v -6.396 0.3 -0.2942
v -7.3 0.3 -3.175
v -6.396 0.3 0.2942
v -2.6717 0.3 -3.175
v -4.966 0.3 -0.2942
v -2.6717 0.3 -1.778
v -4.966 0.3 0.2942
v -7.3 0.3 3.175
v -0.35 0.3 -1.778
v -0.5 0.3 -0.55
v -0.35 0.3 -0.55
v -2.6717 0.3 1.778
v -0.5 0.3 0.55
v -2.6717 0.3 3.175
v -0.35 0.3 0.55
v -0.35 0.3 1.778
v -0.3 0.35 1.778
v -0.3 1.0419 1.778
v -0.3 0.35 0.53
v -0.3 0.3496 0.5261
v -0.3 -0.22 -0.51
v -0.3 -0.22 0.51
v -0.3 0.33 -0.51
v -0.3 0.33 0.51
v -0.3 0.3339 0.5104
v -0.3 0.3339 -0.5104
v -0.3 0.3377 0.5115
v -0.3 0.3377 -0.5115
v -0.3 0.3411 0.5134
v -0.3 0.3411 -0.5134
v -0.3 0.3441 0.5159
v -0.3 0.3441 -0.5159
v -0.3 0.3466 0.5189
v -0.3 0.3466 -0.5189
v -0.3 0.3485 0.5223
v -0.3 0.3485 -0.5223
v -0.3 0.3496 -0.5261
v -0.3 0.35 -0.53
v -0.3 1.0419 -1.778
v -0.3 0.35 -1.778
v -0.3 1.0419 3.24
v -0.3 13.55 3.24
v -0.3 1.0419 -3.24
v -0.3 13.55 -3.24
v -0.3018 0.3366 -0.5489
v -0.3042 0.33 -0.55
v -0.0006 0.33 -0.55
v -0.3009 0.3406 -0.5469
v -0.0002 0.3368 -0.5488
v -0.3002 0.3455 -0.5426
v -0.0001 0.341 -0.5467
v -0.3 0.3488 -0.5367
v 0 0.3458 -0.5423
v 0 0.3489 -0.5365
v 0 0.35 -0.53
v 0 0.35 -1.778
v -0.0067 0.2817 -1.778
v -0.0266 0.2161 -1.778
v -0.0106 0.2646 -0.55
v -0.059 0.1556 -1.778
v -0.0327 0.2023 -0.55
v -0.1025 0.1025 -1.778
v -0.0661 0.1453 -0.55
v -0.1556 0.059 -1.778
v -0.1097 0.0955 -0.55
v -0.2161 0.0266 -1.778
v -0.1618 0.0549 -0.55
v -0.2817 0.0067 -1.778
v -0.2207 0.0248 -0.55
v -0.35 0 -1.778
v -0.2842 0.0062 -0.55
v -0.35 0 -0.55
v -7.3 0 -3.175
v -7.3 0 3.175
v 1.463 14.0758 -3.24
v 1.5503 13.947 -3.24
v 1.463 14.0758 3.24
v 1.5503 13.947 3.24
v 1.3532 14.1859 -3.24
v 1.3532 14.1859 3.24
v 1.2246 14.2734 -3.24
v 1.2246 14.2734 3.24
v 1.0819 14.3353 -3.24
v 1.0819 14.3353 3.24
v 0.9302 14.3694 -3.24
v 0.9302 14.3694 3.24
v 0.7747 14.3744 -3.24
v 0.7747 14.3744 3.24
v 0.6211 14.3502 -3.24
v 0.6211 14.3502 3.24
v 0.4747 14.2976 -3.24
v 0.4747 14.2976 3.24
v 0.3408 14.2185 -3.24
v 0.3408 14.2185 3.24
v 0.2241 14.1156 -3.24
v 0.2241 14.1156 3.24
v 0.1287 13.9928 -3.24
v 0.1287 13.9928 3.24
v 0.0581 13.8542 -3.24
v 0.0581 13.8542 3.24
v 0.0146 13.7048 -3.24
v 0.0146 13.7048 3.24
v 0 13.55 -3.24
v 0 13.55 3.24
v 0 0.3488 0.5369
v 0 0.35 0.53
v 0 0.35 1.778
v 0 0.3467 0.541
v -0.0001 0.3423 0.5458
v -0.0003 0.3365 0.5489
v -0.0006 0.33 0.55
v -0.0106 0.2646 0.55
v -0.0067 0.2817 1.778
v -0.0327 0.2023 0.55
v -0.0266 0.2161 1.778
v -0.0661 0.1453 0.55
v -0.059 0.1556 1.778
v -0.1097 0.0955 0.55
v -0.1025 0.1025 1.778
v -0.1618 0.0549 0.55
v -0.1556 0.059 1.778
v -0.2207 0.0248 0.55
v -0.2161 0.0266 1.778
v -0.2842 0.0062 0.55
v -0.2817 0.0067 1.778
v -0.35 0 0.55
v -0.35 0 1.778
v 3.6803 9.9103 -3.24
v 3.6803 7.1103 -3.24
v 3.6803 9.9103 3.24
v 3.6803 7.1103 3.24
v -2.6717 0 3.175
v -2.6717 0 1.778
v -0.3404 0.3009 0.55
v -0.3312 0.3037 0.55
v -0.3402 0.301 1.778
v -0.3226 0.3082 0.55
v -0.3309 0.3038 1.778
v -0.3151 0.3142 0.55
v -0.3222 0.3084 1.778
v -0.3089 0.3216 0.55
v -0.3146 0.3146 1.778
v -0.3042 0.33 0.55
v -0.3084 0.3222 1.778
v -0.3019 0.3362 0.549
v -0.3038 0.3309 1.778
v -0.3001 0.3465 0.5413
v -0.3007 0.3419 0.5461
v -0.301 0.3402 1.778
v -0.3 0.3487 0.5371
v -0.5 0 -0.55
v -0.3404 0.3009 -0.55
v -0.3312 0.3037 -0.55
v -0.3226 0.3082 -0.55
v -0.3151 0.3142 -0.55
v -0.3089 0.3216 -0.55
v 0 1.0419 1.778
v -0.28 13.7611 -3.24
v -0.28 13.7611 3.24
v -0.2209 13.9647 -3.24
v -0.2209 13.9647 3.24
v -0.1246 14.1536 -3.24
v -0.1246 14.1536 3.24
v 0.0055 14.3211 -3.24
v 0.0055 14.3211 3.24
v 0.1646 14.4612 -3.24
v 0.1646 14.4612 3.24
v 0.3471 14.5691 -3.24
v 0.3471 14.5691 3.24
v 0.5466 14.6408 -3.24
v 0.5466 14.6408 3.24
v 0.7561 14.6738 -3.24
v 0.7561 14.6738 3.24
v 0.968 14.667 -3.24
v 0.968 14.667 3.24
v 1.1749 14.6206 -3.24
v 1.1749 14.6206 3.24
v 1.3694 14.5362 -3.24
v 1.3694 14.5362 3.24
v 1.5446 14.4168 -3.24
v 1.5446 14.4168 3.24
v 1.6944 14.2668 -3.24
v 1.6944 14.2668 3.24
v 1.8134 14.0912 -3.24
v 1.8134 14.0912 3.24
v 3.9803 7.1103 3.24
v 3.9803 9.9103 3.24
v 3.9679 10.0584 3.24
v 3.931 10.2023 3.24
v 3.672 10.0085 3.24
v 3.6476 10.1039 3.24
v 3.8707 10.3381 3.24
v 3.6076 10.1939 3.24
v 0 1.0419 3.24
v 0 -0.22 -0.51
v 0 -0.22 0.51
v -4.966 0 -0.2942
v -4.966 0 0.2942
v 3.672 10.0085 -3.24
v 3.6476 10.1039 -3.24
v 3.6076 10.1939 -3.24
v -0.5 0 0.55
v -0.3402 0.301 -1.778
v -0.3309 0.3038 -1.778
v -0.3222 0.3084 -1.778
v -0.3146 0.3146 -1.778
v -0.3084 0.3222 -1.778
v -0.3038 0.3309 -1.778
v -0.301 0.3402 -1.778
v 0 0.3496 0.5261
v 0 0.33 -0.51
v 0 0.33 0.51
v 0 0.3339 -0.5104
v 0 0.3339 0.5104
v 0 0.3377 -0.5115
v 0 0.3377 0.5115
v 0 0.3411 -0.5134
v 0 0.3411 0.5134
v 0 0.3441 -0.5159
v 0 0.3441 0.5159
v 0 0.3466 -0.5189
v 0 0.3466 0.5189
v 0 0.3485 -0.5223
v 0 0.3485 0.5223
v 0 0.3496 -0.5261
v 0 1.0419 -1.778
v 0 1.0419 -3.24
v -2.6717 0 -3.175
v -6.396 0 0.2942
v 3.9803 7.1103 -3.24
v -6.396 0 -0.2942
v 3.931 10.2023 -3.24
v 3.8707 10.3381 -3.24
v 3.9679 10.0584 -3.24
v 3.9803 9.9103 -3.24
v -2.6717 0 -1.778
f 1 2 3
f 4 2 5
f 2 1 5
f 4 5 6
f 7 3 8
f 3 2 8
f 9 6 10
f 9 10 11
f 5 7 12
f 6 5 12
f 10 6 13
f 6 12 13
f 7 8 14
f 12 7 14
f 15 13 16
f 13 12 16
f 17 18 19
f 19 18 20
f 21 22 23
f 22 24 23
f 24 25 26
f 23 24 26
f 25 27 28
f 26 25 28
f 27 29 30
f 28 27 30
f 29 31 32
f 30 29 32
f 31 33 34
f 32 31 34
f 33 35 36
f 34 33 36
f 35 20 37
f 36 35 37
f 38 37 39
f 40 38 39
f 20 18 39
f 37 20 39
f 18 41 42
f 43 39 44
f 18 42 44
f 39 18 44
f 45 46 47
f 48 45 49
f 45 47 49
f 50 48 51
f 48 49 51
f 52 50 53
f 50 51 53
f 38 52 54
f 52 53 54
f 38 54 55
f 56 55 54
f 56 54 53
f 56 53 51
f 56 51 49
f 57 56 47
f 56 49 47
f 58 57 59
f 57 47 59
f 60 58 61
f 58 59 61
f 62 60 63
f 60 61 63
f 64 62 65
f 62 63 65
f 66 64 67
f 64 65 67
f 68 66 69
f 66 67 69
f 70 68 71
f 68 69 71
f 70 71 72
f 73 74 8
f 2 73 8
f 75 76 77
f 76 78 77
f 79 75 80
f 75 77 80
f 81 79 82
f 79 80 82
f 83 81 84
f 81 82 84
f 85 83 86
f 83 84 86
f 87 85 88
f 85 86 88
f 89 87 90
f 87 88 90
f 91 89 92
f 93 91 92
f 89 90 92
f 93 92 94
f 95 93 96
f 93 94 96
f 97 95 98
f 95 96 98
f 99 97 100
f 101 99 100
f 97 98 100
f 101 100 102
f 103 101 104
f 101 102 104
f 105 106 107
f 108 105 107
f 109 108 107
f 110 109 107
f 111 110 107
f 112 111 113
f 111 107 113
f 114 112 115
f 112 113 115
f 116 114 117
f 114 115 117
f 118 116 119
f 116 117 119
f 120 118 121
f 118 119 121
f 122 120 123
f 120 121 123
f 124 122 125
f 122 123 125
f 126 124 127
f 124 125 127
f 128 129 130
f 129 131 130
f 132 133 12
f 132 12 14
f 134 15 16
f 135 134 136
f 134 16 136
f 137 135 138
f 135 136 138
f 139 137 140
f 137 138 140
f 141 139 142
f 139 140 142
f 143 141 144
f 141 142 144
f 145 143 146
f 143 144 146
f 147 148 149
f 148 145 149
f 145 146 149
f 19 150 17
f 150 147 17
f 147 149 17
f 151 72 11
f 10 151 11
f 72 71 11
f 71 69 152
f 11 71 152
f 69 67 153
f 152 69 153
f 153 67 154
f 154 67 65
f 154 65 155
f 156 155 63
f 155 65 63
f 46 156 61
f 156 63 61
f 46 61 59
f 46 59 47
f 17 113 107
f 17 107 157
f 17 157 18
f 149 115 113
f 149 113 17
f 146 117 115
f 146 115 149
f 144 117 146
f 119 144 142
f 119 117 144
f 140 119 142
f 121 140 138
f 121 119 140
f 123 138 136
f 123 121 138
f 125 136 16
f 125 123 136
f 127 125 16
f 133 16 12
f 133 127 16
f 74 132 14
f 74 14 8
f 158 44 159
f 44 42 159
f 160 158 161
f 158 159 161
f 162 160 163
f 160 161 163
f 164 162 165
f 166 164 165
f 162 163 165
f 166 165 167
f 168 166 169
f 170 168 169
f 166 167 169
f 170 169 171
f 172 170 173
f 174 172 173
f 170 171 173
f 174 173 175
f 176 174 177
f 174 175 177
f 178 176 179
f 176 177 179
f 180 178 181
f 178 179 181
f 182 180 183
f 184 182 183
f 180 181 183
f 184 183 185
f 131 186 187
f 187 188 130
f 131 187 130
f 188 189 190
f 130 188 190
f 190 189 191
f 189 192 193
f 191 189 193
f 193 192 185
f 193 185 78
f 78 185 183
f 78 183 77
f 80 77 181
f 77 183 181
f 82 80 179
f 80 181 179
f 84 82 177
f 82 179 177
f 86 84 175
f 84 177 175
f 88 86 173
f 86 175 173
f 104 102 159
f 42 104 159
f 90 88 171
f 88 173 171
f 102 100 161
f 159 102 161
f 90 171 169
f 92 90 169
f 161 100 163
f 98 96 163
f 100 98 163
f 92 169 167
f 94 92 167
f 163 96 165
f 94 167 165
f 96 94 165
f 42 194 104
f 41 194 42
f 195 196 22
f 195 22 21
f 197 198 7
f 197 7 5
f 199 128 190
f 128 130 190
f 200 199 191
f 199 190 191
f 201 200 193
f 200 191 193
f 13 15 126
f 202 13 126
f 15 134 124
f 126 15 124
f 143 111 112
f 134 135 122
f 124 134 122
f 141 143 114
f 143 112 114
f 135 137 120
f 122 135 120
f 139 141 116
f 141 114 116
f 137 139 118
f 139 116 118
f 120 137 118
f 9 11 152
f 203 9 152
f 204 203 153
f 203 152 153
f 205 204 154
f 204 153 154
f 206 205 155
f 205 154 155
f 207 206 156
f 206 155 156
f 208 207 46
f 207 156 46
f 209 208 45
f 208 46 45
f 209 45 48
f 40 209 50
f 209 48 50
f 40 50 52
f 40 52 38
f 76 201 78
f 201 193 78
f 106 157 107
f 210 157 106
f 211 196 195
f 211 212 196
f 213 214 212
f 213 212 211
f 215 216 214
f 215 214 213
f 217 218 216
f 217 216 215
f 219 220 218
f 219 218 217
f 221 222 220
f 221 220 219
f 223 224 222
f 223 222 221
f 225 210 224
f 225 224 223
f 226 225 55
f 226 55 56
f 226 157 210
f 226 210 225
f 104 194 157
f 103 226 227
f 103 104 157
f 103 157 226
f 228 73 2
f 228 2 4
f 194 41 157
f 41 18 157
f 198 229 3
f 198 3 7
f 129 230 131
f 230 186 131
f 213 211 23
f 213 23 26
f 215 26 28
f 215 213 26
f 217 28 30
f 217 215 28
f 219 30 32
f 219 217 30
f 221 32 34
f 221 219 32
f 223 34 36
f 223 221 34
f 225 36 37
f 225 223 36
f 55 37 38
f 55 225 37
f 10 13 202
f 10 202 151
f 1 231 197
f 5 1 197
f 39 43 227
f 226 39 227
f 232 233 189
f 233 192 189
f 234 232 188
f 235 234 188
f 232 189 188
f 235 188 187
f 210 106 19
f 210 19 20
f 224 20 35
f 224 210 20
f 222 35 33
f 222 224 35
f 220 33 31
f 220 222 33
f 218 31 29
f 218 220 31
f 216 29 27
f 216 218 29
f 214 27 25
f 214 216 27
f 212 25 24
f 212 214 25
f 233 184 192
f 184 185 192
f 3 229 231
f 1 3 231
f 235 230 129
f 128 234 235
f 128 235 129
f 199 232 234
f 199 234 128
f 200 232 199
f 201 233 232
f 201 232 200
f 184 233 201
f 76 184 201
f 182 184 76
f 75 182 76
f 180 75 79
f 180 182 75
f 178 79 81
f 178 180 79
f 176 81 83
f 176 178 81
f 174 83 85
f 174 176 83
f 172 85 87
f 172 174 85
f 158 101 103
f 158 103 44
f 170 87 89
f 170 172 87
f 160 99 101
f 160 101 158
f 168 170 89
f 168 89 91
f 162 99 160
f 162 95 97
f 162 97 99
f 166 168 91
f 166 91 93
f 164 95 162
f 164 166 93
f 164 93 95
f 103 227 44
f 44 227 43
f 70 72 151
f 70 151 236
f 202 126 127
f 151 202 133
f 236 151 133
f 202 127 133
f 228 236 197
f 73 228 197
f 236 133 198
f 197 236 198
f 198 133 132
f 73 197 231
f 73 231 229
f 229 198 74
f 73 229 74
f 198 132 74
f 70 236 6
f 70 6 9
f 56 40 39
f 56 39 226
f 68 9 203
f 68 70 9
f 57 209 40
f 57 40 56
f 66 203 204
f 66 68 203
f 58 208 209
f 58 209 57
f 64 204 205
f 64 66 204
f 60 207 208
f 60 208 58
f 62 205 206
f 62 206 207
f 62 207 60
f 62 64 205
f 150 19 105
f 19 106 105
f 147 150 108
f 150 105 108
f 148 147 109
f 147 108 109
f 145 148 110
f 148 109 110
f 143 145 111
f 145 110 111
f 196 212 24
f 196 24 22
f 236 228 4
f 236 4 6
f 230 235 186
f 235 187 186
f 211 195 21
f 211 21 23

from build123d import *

# Parameters (mm, degrees)
Y_KSEKLIK_EKSTR_ZYON1_DEPTH = 3.24
IZIM2_W                     = 1.429951724
IZIM2_H                     = 0.588312172
KES_EKSTR_ZYON1_DEPTH       = 1.04186858
KES_EKSTR_ZYON2_DEPTH       = 0.5
Y_KSEKLIK_EKSTR_ZYON2_DEPTH = 0.3


with BuildPart() as part:
    # Çizim1 → Yükseklik-Ekstrüzyon1 (new, symmetric)
    with BuildSketch(Plane.XY):
        with BuildLine():
            Line((-0.3, 0.35), (-0.3, 13.55))
            ThreePointArc((-0.3, 13.55), (0.546641464, 14.640795493), (1.813383319, 14.091248725))
            Line((1.813383319, 14.091248725), (3.870705293, 10.338139841))
            ThreePointArc((3.870705293, 10.338139841), (3.952443157, 10.131139603), (3.9802691, 9.910332234))
            Line((3.9802691, 9.910332234), (3.9802691, 7.110332234))
            Line((3.9802691, 7.110332234), (3.6802691, 7.110332234))
            Line((3.6802691, 7.110332234), (3.6802691, 9.910332234))
            ThreePointArc((3.6802691, 9.910332234), (3.661822688, 10.056710153), (3.607636913, 10.19393503))
            Line((3.607636913, 10.19393503), (1.550314939, 13.947043914))
            ThreePointArc((1.550314939, 13.947043914), (0.621070914, 14.350175024), (0, 13.55))
            Line((0, 13.55), (0, 0.35))
            ThreePointArc((0, 0.35), (-0.102512627, 0.102512627), (-0.35, 0))
            Line((-0.35, 0), (-7.3, 0))
            Line((-7.3, 0), (-7.3, 0.3))
            Line((-7.3, 0.3), (-0.35, 0.3))
            ThreePointArc((-0.35, 0.3), (-0.314644661, 0.314644661), (-0.3, 0.35))
        make_face()
    extrude(amount=Y_KSEKLIK_EKSTR_ZYON1_DEPTH, both=True)

    # Çizim2 → Kes-Ekstrüzyon1 (cut)
    with BuildSketch(Plane(origin=(0, 0, 0), x_dir=(1, 0, 0), z_dir=(0, 1, 0))):
        Polygon((0, -4), (0, -1.778), (-2.671699332, -1.778), (-2.671699332, -3.175), (-7.3, -3.175), (-7.3, 3.175), (-2.671699332, 3.175), (-2.671699332, 1.778), (0, 1.778), (0, 4), (-8, 4), (-8, -4), align=None)
        with Locations((-5.68100521, 0)):
            Rectangle(IZIM2_W, IZIM2_H)
    extrude(amount=KES_EKSTR_ZYON1_DEPTH, mode=Mode.SUBTRACT)

    # Çizim4 → Kes-Ekstrüzyon2 (cut)
    with BuildSketch(Plane(origin=(0, 0, 0), x_dir=(0, 0, -1), z_dir=(1, 0, 0))):
        with BuildLine():
            Line((-0.55, -0.15), (0.55, -0.15))
            Line((0.55, -0.15), (0.55, 0.33))
            ThreePointArc((0.55, 0.33), (0.544142136, 0.344142136), (0.53, 0.35))
            Line((0.53, 0.35), (-0.53, 0.35))
            ThreePointArc((-0.53, 0.35), (-0.544142136, 0.344142136), (-0.55, 0.33))
            Line((-0.55, 0.33), (-0.55, -0.15))
        make_face()
    extrude(amount=-KES_EKSTR_ZYON2_DEPTH, mode=Mode.SUBTRACT)

    # Çizim5 → Yükseklik-Ekstrüzyon2 (add)
    with BuildSketch(Plane(origin=(0, 0, 0), x_dir=(0, 0, -1), z_dir=(1, 0, 0))):
        with BuildLine():
            Line((-0.51, -0.22), (0.51, -0.22))
            Line((0.51, -0.22), (0.51, 0.33))
            ThreePointArc((0.51, 0.33), (0.515857864, 0.344142136), (0.53, 0.35))
            Line((0.53, 0.35), (-0.53, 0.35))
            ThreePointArc((-0.53, 0.35), (-0.515857864, 0.344142136), (-0.51, 0.33))
            Line((-0.51, 0.33), (-0.51, -0.22))
        make_face()
    extrude(amount=-Y_KSEKLIK_EKSTR_ZYON2_DEPTH)


solid = part.part
